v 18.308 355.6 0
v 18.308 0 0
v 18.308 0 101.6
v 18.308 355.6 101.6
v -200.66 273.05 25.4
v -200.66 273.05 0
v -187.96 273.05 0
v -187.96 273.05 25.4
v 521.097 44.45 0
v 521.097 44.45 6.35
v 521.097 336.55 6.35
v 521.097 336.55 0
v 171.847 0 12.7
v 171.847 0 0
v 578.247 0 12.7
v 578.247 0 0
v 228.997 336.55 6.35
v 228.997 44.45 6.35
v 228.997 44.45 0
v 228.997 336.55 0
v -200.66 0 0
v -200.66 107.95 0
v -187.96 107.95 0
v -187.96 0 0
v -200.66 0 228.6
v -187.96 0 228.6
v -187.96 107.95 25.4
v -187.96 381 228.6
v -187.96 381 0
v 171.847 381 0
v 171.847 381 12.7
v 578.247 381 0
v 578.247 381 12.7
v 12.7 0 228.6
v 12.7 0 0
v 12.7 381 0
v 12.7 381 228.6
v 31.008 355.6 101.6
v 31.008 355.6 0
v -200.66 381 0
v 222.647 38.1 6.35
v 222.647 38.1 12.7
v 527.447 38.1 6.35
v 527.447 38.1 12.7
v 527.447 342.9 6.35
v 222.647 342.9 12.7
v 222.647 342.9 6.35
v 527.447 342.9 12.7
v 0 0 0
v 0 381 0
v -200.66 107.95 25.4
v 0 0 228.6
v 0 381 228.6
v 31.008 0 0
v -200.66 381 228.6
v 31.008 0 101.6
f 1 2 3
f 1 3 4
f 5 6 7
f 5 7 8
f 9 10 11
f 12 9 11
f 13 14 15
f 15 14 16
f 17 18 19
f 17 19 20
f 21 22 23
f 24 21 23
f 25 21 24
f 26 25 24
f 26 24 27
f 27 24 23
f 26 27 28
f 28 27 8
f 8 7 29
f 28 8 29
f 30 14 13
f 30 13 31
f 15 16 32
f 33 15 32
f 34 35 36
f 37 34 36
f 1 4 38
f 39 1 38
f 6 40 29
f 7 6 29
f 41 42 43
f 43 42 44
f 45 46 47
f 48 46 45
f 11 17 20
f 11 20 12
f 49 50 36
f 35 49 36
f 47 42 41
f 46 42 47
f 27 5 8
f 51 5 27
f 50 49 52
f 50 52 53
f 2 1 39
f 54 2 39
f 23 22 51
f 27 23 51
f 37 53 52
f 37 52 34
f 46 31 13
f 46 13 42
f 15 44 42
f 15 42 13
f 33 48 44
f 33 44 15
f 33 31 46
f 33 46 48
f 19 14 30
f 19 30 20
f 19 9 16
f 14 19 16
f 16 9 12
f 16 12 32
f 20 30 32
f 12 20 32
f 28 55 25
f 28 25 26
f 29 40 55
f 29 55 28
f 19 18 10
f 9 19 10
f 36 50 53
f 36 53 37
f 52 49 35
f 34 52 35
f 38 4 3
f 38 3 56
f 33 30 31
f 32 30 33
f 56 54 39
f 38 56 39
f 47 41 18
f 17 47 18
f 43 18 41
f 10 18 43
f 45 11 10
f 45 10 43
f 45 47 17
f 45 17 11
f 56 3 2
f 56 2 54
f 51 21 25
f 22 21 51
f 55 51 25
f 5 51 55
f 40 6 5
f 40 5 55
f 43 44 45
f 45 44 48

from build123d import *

# Parameters (mm, degrees)
F0_W      = 12.7
F0_H      = 381
F1_DEPTH  = 228.6
F2_W      = 406.4
F2_H      = 381
F3_DEPTH  = 12.7
F4_W      = 304.8
F4_H      = 304.8
F5_DEPTH  = 6.35
F6_W      = 292.1
F6_H      = 292.1
F7_DEPTH  = 12.701
F9_W      = 165.1
F9_H      = 50.8
F10_DEPTH = 25.4
F11_W     = 12.7
F11_H     = 355.6
F12_DEPTH = 101.6


with BuildPart() as f1:
    # F0 (on Top) → F1 (new body)
    with BuildSketch(Plane.XY):
        with Locations((6.35, 190.5)):
            Rectangle(F0_W, F0_H)
    extrude(amount=F1_DEPTH)


with BuildPart() as f3:
    # F2 (on Top) → F3 (new body)
    with BuildSketch(Plane.XY):
        with Locations((375.046956, 190.5)):
            Rectangle(F2_W, F2_H)
    extrude(amount=F3_DEPTH)

    # F4 (on face) → F5 (cut)
    with BuildSketch(Plane.XY.offset(12.7)):
        with Locations((375.046956, 190.5)):
            Rectangle(F4_W, F4_H)
    extrude(amount=-F5_DEPTH, mode=Mode.SUBTRACT)

    # F6 (on face) → F7 (cut, through all)
    with BuildSketch(Plane.XY.offset(12.7)):
        with Locations((375.046956, 190.5)):
            Rectangle(F6_W, F6_H)
    extrude(amount=-F7_DEPTH, mode=Mode.SUBTRACT)


with BuildPart() as f8_1:
    # F8: copy of F1
    add(f1.part.moved(Location((-200.66, 0, 0))))

    # F9 (on face) → F10 (cut)
    with BuildSketch(Plane(origin=(-200.66, 0, 0), x_dir=(0, -1, 0), z_dir=(-1, 0, 0))):
        with Locations((-190.5, 0)):
            Rectangle(F9_W, F9_H)
    extrude(amount=-F10_DEPTH, mode=Mode.SUBTRACT)


with BuildPart() as f12:
    # F11 (on Top) → F12 (new body)
    with BuildSketch(Plane.XY):
        with Locations((24.657567, 177.8)):
            Rectangle(F11_W, F11_H)
    extrude(amount=F12_DEPTH)


solid = Compound([f1.part, f3.part, f8_1.part, f12.part])
